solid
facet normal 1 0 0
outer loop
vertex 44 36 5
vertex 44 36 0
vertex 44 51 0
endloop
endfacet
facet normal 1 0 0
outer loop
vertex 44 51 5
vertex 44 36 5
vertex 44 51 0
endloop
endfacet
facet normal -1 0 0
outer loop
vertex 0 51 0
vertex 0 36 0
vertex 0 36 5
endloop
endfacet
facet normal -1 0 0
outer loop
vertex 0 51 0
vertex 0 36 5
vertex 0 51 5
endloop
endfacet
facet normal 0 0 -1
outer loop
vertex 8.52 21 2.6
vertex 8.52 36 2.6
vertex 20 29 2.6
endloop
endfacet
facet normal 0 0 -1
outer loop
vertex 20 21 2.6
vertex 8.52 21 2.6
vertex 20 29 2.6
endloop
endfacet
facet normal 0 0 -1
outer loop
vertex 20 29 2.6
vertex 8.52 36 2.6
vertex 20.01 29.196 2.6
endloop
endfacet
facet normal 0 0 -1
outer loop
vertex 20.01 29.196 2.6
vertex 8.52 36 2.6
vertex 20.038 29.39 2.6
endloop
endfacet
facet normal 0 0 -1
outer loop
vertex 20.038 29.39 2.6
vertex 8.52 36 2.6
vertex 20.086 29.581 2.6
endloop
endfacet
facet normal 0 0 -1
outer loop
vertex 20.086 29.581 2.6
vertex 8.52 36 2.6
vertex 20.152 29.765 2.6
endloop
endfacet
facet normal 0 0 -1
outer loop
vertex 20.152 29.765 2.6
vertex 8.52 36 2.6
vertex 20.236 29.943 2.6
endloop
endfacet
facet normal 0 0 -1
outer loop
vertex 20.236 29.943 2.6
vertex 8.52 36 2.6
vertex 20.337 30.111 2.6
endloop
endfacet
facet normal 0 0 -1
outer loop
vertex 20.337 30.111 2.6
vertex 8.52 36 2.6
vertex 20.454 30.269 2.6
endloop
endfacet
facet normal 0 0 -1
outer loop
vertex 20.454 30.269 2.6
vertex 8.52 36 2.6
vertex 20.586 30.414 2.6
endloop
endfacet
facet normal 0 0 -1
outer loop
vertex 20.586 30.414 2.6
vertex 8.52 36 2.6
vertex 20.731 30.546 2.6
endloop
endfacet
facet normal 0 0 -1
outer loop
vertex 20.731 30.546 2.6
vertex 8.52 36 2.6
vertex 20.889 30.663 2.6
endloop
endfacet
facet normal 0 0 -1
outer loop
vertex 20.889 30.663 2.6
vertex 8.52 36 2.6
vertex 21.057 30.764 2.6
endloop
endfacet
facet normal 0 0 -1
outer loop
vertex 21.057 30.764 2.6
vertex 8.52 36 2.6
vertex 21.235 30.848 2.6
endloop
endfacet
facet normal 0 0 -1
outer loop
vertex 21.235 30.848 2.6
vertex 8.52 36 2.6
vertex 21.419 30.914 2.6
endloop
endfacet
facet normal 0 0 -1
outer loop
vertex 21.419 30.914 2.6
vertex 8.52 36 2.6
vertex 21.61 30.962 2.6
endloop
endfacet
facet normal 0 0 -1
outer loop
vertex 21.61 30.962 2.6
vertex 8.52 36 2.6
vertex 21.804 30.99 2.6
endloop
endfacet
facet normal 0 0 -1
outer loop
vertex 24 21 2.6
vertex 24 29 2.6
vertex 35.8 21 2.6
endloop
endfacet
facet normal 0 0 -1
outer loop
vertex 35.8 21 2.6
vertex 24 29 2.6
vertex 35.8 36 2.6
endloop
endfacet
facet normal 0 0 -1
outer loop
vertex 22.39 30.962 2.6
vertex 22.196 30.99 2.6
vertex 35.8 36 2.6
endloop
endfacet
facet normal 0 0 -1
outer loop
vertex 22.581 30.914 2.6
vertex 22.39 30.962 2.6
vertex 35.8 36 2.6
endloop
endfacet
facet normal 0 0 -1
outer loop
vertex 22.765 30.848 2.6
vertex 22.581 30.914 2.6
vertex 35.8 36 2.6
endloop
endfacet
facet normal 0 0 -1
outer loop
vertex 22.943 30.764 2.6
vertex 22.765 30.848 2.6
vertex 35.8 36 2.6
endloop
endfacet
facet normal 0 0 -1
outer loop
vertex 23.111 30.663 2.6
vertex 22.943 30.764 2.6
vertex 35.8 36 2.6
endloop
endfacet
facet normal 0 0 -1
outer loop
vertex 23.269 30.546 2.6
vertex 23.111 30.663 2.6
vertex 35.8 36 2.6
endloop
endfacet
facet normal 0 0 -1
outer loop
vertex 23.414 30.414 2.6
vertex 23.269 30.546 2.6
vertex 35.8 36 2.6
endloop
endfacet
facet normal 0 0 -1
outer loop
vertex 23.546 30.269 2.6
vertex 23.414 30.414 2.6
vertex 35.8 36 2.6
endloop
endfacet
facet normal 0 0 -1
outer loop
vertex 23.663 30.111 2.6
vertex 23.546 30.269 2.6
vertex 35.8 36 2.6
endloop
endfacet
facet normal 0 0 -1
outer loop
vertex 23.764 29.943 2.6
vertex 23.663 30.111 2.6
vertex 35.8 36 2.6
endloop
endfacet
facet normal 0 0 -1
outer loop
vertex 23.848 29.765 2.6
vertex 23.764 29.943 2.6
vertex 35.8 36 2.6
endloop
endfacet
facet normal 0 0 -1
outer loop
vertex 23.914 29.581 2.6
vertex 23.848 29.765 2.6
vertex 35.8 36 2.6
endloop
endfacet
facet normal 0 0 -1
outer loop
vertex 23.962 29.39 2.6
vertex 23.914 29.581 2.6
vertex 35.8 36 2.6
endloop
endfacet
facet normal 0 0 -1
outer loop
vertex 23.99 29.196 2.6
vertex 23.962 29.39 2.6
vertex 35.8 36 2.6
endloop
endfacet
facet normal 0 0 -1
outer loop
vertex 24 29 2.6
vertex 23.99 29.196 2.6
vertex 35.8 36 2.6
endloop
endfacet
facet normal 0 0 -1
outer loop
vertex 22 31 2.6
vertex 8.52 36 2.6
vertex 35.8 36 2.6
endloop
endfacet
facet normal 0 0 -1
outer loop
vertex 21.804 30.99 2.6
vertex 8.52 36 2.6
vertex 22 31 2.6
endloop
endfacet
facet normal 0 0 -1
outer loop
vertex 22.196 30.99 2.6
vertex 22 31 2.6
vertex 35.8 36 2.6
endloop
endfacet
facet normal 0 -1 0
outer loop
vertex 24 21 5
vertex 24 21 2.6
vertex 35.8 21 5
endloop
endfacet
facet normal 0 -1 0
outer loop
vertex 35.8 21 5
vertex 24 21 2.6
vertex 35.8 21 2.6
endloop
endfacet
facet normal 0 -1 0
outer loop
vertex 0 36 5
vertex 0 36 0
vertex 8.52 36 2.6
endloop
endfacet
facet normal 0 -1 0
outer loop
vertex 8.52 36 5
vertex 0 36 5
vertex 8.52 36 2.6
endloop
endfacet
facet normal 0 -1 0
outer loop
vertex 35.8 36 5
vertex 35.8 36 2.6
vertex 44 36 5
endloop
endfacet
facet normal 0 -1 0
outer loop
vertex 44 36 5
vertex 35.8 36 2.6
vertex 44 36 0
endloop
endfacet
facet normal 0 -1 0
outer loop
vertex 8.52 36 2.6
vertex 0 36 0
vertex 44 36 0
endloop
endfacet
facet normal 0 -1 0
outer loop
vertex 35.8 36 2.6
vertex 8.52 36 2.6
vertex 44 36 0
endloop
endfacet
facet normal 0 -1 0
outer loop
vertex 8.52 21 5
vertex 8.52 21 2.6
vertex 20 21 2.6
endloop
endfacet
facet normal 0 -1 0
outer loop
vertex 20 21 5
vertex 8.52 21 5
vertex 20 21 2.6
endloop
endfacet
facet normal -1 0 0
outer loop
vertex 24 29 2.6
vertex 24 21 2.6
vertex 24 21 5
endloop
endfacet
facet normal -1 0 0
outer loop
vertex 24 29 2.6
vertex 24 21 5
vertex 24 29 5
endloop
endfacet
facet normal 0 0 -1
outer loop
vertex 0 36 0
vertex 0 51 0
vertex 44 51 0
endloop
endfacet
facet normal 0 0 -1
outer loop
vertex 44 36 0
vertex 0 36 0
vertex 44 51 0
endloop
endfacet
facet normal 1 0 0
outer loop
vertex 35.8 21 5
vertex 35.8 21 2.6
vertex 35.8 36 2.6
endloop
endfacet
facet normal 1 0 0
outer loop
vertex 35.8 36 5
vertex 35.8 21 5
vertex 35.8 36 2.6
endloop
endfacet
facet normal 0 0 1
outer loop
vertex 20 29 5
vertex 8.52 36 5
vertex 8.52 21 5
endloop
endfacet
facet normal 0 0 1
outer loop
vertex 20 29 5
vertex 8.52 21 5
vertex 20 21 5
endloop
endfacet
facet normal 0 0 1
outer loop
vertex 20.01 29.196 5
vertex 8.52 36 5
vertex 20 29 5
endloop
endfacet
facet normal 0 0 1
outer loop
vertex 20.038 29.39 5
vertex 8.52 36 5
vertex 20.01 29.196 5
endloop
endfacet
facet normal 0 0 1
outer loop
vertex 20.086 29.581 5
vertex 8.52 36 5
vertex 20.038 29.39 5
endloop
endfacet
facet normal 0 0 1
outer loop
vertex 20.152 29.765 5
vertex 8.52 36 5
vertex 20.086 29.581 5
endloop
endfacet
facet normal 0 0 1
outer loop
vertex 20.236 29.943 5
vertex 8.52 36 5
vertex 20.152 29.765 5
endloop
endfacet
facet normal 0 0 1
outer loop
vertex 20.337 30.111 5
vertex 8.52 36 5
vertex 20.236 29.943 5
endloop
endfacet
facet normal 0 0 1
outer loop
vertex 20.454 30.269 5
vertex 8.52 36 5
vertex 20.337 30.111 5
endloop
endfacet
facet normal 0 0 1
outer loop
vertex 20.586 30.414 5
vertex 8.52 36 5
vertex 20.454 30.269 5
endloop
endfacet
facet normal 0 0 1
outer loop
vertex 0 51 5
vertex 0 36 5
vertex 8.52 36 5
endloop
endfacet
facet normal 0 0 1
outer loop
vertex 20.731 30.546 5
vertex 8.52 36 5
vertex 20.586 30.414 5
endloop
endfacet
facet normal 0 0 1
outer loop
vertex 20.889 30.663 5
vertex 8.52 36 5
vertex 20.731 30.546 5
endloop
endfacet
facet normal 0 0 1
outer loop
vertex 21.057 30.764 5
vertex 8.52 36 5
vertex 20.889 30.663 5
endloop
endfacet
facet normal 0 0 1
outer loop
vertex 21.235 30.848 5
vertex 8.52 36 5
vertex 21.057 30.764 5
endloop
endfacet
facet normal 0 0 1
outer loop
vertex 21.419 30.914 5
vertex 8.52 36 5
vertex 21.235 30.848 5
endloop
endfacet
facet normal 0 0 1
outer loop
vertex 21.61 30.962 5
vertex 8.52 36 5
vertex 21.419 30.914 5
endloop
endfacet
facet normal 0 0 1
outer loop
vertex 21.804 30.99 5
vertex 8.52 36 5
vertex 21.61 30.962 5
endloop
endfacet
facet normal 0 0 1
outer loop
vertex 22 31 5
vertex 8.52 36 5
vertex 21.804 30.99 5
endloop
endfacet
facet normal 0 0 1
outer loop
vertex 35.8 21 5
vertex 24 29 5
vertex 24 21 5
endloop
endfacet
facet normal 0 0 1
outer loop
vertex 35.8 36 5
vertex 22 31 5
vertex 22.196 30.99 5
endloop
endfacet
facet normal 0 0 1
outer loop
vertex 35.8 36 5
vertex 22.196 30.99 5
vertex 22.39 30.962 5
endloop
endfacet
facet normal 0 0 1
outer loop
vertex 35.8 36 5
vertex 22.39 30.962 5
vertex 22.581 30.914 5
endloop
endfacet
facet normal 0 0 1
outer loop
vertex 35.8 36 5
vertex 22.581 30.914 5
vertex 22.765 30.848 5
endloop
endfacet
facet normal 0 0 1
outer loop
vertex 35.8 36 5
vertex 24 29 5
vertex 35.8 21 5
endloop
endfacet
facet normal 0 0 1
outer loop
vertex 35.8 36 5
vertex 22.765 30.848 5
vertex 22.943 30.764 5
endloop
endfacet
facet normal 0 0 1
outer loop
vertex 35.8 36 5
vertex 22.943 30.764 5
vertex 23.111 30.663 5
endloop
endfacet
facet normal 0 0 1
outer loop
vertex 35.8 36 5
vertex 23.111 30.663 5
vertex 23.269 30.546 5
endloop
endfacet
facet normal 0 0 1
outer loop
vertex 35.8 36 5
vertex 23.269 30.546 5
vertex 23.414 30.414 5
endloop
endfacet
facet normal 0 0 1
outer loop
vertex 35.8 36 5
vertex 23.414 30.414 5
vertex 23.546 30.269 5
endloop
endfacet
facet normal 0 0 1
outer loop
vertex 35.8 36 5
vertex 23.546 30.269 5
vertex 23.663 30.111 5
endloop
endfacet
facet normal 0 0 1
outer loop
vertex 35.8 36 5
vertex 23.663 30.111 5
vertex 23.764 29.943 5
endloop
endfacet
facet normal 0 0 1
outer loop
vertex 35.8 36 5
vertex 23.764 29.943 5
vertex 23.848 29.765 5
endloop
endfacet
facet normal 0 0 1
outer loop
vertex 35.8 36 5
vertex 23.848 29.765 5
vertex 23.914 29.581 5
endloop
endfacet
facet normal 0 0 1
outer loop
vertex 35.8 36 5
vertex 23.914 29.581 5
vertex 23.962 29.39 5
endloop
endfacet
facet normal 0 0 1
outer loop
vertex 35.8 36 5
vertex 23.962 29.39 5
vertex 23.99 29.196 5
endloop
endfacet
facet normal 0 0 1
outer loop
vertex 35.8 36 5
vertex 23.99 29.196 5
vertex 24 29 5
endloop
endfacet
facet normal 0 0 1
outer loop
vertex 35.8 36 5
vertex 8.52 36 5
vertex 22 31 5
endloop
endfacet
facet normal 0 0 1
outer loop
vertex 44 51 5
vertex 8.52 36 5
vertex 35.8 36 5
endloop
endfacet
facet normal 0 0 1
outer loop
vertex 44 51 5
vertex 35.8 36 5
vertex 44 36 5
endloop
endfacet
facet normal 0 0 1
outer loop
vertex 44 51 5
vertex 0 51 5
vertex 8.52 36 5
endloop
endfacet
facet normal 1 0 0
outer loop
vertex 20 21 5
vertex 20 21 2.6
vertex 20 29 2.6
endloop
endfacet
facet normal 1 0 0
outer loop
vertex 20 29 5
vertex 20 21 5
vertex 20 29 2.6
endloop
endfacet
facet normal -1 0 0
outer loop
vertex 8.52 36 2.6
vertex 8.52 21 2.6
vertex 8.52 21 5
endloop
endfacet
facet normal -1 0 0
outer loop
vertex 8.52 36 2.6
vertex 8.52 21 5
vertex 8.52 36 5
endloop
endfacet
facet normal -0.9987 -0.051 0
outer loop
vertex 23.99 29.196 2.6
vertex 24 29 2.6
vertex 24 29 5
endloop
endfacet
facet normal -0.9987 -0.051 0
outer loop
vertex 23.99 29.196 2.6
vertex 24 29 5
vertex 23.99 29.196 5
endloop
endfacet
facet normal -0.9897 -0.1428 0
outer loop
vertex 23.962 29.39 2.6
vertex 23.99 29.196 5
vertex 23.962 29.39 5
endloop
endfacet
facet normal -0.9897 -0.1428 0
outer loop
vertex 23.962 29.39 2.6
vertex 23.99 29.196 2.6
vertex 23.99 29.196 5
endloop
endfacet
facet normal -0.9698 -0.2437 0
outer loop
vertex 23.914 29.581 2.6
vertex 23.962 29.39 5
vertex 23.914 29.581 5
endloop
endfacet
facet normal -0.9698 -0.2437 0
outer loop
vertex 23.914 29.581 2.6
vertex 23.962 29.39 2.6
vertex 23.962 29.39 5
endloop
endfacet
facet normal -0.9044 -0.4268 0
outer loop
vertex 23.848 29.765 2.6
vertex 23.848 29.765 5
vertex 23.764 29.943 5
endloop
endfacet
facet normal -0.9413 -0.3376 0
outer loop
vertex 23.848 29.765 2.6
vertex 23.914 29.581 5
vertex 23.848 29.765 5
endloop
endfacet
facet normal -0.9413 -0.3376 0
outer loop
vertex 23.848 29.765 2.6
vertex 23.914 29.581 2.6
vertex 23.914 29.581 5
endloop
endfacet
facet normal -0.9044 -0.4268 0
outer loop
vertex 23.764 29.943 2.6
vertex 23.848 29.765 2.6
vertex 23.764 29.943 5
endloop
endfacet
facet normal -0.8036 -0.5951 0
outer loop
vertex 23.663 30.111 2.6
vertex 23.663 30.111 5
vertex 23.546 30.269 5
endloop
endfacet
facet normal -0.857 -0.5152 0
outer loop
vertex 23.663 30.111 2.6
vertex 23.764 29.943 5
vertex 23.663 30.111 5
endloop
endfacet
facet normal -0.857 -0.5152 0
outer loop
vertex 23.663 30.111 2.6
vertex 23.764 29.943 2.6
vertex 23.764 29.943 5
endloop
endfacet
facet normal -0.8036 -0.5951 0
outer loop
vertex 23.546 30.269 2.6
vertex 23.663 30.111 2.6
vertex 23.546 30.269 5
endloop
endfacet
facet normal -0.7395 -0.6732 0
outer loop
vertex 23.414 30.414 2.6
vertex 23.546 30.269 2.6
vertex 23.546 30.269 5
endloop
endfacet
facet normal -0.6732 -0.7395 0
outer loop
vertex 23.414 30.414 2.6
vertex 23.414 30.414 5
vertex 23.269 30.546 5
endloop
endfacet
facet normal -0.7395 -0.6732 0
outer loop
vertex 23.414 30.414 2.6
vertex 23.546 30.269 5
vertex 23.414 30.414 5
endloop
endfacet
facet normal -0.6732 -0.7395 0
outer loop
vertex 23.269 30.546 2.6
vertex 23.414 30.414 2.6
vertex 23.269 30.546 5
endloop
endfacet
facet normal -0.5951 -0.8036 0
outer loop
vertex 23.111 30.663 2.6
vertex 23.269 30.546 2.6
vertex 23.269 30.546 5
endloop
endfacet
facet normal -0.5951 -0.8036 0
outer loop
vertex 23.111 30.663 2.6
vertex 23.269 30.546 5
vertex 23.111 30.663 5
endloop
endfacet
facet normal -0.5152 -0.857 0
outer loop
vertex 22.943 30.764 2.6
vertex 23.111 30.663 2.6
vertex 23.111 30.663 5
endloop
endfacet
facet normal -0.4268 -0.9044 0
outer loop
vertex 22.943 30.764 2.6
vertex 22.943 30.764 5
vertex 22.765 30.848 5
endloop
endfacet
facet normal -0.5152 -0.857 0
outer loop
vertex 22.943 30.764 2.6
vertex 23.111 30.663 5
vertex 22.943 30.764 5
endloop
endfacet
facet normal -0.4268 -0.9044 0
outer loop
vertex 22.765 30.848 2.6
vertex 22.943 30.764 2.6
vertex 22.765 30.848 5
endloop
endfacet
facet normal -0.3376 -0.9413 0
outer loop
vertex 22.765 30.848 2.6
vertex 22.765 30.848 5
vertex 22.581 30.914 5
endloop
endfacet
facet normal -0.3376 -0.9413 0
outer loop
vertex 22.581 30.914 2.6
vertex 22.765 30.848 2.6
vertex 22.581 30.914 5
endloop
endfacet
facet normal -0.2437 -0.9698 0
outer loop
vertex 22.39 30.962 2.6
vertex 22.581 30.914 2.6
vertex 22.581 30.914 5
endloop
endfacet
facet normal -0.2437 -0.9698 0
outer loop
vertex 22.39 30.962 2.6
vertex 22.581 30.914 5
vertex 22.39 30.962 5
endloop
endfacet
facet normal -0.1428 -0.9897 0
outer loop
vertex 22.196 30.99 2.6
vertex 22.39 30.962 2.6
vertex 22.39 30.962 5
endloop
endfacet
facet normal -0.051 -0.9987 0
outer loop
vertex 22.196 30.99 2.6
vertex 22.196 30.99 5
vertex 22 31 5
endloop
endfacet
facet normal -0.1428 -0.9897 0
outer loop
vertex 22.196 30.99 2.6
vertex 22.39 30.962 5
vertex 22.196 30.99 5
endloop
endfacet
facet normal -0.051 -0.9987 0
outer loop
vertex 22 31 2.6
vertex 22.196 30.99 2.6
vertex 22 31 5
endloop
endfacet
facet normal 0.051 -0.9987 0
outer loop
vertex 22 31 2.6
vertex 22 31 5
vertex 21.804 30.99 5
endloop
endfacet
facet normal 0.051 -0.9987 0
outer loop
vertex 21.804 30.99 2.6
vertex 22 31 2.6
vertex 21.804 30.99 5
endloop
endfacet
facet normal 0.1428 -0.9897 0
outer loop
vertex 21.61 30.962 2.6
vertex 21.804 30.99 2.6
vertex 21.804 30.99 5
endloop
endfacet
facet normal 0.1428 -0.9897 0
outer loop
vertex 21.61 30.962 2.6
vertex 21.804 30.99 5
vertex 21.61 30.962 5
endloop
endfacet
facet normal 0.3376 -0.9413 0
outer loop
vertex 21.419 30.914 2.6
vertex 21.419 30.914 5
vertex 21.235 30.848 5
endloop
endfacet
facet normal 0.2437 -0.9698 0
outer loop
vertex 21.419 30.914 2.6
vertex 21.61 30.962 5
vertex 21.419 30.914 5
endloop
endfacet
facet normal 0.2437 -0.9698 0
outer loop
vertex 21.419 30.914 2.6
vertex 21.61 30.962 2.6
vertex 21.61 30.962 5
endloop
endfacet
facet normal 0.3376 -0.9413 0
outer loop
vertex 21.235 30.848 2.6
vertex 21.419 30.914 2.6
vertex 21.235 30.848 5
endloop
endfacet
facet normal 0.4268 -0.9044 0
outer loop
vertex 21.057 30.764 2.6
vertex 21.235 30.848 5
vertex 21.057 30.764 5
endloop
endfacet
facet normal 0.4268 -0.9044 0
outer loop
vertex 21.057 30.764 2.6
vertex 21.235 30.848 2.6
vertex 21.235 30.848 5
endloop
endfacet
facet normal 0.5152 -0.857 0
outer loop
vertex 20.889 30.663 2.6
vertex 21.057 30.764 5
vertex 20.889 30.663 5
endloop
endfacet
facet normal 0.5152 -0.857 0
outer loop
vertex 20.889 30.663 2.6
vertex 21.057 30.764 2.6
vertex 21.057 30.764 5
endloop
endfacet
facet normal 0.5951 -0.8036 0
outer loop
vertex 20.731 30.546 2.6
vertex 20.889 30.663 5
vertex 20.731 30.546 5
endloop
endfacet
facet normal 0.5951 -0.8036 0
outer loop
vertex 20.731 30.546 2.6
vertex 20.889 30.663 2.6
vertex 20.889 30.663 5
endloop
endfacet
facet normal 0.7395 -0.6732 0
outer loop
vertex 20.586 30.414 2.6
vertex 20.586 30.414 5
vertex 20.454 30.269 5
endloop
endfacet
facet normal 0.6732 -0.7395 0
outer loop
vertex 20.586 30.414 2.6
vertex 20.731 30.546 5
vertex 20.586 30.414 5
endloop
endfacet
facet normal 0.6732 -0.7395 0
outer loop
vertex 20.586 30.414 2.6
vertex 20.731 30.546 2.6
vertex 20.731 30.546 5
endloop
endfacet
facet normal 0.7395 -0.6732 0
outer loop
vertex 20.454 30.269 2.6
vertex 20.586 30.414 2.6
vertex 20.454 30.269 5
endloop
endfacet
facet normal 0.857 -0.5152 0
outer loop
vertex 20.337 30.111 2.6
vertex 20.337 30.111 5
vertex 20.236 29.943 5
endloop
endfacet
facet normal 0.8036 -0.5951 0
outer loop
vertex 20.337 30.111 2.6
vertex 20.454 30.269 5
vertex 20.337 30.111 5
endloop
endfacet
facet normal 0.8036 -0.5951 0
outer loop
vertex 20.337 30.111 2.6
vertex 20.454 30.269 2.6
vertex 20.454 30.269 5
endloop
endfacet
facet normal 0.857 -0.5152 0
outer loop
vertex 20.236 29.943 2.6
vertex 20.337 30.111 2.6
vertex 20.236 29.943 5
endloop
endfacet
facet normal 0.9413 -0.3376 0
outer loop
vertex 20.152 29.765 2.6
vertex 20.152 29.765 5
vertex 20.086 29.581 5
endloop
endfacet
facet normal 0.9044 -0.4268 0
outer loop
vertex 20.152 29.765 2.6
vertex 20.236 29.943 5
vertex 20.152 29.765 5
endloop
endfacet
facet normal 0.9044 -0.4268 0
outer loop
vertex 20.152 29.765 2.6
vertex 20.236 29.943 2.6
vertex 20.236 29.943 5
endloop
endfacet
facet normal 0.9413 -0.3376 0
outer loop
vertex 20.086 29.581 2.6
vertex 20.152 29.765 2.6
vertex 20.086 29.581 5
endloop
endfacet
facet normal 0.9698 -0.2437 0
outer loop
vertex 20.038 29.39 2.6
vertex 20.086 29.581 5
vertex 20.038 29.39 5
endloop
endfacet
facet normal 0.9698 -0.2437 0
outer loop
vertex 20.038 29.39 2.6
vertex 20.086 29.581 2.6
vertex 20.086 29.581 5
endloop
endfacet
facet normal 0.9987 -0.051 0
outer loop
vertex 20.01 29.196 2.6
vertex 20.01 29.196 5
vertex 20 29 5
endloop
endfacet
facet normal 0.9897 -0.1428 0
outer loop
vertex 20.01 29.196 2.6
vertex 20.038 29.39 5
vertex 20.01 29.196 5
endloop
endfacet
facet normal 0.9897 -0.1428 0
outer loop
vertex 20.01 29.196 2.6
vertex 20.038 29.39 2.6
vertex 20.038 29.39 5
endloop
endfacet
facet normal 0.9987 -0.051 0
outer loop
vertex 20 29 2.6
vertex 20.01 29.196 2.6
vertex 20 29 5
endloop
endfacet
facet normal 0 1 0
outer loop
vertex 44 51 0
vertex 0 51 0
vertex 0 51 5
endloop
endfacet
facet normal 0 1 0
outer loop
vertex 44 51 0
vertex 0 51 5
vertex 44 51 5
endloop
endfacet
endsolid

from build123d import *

# Parameters (mm, degrees)
BOX017_W          = 4
BOX017_H          = 16
BOX017_DEPTH      = 10
CYLINDER022_R     = 2
CYLINDER022_DEPTH = 10
BOX016_W          = 8.2
BOX016_H          = 15
BOX016_DEPTH      = 10
BOX015_W          = 8.52
BOX015_H          = 15
BOX015_DEPTH      = 10
BOX014_W          = 44
BOX014_H          = 15
BOX014_DEPTH      = 2.6
BOX013_W          = 44
BOX013_H          = 30
BOX013_DEPTH      = 5


with BuildPart() as cube017:
    # Box017 → Box017 (new body)
    with BuildSketch(Plane(origin=(20, -8, 0), x_dir=(1, 0, 0), z_dir=(0, 0, 1))):
        with Locations((2, 8)):
            Rectangle(BOX017_W, BOX017_H)
    extrude(amount=BOX017_DEPTH)


with BuildPart() as fusion022:
    # Cylinder022 → Cylinder022 (new body)
    with BuildSketch(Plane(origin=(22, 8, 0), x_dir=(1, 0, 0), z_dir=(0, 0, 1))):
        Circle(CYLINDER022_R)
    extrude(amount=CYLINDER022_DEPTH)

    # Fusion022: union Cube017
    add(cube017.part)


with BuildPart() as cube016:
    # Box016 → Box016 (new body)
    with BuildSketch(Plane(origin=(35.8, 0, 0), x_dir=(1, 0, 0), z_dir=(0, 0, 1))):
        with Locations((4.1, 7.5)):
            Rectangle(BOX016_W, BOX016_H)
    extrude(amount=BOX016_DEPTH)


with BuildPart() as cube015:
    # Box015 → Box015 (new body)
    with BuildSketch(Plane.XY):
        with Locations((4.26, 7.5)):
            Rectangle(BOX015_W, BOX015_H)
    extrude(amount=BOX015_DEPTH)


with BuildPart() as cube014:
    # Box014 → Box014 (new body)
    with BuildSketch(Plane.XY):
        with Locations((22, 7.5)):
            Rectangle(BOX014_W, BOX014_H)
    extrude(amount=BOX014_DEPTH)


with BuildPart() as exterior_part1:
    # Box013 → Box013 (new body)
    with BuildSketch(Plane.XY):
        with Locations((22, 15)):
            Rectangle(BOX013_W, BOX013_H)
    extrude(amount=BOX013_DEPTH)

    # Cut007002002: cut Cube014
    add(cube014.part, mode=Mode.SUBTRACT)

    # Cut007002003: cut Cube015
    add(cube015.part, mode=Mode.SUBTRACT)

    # Cut007002004: cut Cube016
    add(cube016.part, mode=Mode.SUBTRACT)

    # Cut007002005: cut Fusion022
    add(fusion022.part, mode=Mode.SUBTRACT)


with BuildPart() as exterior_part1_1:
    # Cut007002005 placement: moved
    add(exterior_part1.part.moved(Location((0, 21, 0))))


solid = exterior_part1_1.part
